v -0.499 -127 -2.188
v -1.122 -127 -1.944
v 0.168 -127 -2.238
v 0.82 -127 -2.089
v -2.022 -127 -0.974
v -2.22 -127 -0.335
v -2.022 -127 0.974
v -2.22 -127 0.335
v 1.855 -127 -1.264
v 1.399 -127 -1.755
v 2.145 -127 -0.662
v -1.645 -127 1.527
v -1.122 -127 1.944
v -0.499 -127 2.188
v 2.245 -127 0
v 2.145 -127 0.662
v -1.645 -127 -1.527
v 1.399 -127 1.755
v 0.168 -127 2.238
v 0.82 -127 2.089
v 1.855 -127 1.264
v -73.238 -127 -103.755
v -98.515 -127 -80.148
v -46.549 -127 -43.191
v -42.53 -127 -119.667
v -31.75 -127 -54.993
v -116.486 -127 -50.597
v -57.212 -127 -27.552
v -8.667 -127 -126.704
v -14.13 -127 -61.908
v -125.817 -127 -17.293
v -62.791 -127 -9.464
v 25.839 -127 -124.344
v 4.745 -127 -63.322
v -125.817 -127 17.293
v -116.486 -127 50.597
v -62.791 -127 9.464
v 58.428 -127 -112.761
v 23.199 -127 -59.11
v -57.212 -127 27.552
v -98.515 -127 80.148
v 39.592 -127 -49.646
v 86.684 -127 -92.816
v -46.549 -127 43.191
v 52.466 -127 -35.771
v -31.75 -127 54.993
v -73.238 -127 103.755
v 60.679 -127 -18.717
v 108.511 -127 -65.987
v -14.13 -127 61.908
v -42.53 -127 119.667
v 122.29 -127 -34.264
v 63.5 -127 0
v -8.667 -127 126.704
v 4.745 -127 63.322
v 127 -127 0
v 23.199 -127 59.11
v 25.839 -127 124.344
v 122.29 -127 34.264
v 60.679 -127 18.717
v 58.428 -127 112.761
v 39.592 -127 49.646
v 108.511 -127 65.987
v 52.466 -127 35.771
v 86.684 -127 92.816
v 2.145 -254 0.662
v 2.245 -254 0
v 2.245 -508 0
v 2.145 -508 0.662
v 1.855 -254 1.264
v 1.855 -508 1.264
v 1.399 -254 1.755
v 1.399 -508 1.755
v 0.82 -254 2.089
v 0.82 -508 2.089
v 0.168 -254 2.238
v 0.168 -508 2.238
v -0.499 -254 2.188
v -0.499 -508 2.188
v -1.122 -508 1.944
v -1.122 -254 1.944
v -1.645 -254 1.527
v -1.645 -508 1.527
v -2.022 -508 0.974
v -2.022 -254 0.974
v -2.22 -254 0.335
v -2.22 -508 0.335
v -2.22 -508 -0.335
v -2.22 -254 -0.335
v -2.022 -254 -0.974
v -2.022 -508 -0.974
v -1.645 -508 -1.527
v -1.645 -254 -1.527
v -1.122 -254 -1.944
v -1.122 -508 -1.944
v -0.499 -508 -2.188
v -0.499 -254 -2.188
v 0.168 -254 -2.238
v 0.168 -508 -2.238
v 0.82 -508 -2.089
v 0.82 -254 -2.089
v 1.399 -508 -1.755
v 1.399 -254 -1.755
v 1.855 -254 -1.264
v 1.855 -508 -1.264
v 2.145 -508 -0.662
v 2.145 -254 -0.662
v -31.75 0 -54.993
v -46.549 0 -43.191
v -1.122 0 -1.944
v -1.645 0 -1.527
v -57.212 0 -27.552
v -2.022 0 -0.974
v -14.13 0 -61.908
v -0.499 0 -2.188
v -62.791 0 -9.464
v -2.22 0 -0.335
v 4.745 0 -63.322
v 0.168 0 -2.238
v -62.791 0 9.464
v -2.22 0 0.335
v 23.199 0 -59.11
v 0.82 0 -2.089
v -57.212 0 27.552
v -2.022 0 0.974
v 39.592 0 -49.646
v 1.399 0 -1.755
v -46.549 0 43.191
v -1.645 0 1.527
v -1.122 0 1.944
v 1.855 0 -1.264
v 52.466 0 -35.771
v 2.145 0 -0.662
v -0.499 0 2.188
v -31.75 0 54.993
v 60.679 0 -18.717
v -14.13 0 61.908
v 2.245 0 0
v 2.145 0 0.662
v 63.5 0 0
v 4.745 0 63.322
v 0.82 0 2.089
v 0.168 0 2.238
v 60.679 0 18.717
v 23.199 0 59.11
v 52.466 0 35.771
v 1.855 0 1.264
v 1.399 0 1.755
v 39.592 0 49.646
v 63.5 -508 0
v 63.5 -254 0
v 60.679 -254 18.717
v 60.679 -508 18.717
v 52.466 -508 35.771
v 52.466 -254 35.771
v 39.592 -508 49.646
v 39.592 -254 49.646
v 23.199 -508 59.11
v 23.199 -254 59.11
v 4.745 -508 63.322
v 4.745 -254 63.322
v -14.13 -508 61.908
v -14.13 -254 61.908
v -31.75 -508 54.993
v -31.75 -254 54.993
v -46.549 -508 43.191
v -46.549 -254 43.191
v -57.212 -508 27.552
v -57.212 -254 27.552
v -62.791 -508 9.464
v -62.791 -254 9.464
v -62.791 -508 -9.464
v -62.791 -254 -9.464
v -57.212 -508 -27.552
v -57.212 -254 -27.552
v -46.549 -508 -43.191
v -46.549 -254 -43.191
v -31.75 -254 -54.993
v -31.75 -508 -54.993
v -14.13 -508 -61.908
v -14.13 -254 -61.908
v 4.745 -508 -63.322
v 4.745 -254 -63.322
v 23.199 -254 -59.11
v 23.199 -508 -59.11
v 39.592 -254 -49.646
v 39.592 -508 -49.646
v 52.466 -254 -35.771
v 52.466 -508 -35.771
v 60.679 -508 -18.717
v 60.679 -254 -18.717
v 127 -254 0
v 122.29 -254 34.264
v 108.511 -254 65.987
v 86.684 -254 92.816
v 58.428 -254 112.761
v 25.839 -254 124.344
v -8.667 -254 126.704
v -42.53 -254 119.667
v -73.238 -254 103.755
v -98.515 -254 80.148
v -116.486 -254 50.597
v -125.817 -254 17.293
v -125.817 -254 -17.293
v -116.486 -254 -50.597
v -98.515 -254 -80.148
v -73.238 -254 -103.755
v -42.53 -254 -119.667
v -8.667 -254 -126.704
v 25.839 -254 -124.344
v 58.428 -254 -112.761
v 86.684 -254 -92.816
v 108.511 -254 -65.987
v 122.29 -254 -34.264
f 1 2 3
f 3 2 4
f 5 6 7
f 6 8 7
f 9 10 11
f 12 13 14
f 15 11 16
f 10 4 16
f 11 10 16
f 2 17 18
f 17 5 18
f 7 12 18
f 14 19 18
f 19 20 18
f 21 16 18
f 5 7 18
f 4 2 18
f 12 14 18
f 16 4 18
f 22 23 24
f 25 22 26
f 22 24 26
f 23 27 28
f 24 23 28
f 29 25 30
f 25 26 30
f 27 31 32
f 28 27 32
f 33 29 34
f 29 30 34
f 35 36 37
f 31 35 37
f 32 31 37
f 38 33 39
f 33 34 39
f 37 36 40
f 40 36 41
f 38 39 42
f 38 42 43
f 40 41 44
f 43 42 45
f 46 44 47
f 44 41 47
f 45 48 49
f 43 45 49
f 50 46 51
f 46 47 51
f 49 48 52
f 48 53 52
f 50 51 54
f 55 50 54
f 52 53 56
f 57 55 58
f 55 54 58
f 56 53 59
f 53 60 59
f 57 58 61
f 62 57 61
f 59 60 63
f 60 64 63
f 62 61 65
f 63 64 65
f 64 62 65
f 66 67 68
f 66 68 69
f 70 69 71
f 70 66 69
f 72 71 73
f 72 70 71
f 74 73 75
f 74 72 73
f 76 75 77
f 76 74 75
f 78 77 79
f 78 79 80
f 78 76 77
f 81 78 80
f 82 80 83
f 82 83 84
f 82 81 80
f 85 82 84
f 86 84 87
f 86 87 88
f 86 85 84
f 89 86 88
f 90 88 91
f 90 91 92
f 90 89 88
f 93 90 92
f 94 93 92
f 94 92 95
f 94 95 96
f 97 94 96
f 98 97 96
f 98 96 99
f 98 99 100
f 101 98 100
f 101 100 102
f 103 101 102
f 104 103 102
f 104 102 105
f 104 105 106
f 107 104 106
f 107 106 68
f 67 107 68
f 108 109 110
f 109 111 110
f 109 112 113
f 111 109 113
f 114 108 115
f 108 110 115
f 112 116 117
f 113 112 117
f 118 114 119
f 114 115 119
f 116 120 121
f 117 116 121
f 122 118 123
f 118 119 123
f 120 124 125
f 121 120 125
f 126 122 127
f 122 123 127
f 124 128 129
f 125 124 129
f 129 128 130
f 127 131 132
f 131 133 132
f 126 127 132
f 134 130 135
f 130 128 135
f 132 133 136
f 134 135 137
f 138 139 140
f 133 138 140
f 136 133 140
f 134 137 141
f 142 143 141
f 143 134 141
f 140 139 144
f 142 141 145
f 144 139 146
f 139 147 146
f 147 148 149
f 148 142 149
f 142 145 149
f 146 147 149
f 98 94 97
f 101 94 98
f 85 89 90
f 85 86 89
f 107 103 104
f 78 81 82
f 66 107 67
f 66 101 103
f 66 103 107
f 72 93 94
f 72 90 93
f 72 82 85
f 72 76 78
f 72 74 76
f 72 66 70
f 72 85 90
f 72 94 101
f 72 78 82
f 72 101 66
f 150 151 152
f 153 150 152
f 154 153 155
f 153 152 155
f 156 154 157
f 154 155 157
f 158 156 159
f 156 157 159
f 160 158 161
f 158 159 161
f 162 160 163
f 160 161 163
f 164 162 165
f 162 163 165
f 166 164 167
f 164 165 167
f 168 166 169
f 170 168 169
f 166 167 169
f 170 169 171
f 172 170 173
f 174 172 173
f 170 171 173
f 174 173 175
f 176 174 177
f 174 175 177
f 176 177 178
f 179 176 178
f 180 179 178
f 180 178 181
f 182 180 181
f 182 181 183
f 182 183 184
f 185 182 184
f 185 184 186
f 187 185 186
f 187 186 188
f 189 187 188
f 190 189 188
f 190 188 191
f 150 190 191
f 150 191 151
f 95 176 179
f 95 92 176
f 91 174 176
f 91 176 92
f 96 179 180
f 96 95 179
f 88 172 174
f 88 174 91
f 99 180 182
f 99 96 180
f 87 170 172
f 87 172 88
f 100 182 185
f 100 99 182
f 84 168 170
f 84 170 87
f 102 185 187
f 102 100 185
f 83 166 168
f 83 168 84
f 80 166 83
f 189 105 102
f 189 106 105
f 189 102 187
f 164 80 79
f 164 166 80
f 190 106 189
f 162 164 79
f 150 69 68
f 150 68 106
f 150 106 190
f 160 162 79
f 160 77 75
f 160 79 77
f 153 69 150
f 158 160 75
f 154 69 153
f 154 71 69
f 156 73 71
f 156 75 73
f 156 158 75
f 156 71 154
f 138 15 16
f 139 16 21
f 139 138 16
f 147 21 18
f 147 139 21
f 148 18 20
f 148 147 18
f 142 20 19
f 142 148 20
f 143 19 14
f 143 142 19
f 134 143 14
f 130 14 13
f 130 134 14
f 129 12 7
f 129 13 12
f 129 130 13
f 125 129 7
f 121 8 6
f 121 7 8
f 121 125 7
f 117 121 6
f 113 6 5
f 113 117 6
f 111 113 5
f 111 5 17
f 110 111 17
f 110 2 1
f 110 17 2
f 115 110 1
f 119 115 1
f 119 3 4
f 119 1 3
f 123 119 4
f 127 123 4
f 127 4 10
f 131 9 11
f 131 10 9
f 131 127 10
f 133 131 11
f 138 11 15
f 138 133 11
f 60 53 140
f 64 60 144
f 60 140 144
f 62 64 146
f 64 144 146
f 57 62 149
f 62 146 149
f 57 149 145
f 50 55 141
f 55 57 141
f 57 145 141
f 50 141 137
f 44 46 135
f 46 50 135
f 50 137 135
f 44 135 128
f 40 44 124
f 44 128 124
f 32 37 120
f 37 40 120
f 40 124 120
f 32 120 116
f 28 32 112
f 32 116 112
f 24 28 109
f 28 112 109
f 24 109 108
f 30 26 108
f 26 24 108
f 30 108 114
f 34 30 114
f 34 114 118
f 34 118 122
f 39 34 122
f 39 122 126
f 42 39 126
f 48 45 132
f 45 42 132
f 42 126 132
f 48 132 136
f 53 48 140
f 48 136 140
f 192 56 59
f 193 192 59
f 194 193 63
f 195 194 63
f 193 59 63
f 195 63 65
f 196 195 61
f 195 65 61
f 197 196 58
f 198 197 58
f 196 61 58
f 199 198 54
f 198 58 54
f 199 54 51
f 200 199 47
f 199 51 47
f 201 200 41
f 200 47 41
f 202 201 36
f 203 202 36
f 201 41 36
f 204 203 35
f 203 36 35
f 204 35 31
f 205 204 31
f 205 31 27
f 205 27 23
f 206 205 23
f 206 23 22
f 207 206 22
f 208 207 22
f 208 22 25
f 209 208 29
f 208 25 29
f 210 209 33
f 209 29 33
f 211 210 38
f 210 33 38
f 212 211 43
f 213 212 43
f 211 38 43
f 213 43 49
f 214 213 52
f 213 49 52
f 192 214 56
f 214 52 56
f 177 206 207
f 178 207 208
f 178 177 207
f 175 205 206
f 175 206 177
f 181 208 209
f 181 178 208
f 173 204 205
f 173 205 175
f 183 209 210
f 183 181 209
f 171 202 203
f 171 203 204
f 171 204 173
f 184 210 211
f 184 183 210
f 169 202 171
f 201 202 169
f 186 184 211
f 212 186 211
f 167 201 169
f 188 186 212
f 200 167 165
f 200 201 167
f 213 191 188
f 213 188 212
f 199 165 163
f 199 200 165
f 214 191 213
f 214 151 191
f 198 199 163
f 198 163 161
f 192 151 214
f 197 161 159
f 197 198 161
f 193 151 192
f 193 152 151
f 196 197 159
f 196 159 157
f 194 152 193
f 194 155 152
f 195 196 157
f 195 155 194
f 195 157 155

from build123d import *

# Parameters (mm, degrees)
F0_R     = 63.5
F0_R_2   = 2.244615
F1_DEPTH = 508
F3_R     = 127
F4_DEPTH = 127


with BuildPart() as f1:
    # F0 (on Front) → F1 (new body)
    with BuildSketch(Plane.XZ):
        Circle(F0_R)
        Circle(F0_R_2, mode=Mode.SUBTRACT)
    extrude(amount=F1_DEPTH)

    # F3 (on offset) → F4 (join)
    with BuildSketch(Plane.XZ.offset(127)):
        Circle(F3_R)
    extrude(amount=F4_DEPTH)


solid = f1.part
